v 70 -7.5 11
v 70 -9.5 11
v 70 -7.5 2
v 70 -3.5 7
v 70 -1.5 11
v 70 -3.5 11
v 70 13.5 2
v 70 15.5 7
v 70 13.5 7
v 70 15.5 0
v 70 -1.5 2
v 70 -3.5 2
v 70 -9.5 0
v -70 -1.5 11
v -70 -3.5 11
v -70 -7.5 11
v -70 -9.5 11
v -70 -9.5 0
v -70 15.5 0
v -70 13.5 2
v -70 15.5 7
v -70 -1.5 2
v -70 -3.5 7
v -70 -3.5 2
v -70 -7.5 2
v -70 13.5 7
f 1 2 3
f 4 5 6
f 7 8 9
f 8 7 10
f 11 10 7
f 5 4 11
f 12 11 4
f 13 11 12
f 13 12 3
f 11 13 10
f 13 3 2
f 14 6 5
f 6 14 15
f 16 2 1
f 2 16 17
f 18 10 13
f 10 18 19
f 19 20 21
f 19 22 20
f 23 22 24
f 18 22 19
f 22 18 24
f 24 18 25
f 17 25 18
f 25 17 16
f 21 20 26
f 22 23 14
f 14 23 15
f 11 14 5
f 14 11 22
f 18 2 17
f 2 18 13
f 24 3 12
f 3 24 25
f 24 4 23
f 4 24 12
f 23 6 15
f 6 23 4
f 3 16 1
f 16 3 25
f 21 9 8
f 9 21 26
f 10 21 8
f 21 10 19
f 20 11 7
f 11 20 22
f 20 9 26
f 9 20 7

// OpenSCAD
// [FL_INDEX: keywords="openscad, 3d_parametric, Glass_whiteboard_marker_holder, csg_solid" | COT="Parametric OpenSCAD design from 3DCodeverse"]
// Title: Glass whiteboard marker holder

// ===== file: Whiteboard_tray_-_eraser.scad =====
wall_thickness = 2;
tray_height = 15;
tray_width = 30;
clip_height = 15;
clip_width = 4;
holder_length = 130;

module marker_holder() {
  translate([-holder_length / 2, -(clip_width + tray_width) / 2, 0]) {
		union() {
      	difference() {
        		cube([holder_length, clip_width + 2 * wall_thickness, clip_height]);
        			translate([0, wall_thickness, wall_thickness]) {
          			cube([holder_length, clip_width, clip_height]);
      			}
    		}
    		translate([0, clip_width + wall_thickness, 0]) {
      		difference() {
        			cube([holder_length, tray_width + 2 * wall_thickness, tray_height]);
        				translate([0, wall_thickness, wall_thickness]) {
          				cube([holder_length, tray_width, tray_height]);
						}
        		}
      	}
    	}
  	}
}

marker_holder();



// ===== file: Whiteboard_tray_-_marker.scad =====
wall_thickness = 2;
tray_height = 7;
tray_width = 15;
clip_height = 11;
clip_width = 4;
holder_length = 140;

module marker_holder() {
  translate([-holder_length / 2, -(clip_width + tray_width) / 2, 0]) {
		union() {
      	difference() {
        		cube([holder_length, clip_width + 2 * wall_thickness, clip_height]);
        			translate([0, wall_thickness, wall_thickness]) {
          			cube([holder_length, clip_width, clip_height]);
      			}
    		}
    		translate([0, clip_width + wall_thickness, 0]) {
      		difference() {
        			cube([holder_length, tray_width + 2 * wall_thickness, tray_height]);
        				translate([0, wall_thickness, wall_thickness]) {
          				cube([holder_length, tray_width, tray_height]);
						}
        		}
      	}
    	}
  	}
}

marker_holder();
